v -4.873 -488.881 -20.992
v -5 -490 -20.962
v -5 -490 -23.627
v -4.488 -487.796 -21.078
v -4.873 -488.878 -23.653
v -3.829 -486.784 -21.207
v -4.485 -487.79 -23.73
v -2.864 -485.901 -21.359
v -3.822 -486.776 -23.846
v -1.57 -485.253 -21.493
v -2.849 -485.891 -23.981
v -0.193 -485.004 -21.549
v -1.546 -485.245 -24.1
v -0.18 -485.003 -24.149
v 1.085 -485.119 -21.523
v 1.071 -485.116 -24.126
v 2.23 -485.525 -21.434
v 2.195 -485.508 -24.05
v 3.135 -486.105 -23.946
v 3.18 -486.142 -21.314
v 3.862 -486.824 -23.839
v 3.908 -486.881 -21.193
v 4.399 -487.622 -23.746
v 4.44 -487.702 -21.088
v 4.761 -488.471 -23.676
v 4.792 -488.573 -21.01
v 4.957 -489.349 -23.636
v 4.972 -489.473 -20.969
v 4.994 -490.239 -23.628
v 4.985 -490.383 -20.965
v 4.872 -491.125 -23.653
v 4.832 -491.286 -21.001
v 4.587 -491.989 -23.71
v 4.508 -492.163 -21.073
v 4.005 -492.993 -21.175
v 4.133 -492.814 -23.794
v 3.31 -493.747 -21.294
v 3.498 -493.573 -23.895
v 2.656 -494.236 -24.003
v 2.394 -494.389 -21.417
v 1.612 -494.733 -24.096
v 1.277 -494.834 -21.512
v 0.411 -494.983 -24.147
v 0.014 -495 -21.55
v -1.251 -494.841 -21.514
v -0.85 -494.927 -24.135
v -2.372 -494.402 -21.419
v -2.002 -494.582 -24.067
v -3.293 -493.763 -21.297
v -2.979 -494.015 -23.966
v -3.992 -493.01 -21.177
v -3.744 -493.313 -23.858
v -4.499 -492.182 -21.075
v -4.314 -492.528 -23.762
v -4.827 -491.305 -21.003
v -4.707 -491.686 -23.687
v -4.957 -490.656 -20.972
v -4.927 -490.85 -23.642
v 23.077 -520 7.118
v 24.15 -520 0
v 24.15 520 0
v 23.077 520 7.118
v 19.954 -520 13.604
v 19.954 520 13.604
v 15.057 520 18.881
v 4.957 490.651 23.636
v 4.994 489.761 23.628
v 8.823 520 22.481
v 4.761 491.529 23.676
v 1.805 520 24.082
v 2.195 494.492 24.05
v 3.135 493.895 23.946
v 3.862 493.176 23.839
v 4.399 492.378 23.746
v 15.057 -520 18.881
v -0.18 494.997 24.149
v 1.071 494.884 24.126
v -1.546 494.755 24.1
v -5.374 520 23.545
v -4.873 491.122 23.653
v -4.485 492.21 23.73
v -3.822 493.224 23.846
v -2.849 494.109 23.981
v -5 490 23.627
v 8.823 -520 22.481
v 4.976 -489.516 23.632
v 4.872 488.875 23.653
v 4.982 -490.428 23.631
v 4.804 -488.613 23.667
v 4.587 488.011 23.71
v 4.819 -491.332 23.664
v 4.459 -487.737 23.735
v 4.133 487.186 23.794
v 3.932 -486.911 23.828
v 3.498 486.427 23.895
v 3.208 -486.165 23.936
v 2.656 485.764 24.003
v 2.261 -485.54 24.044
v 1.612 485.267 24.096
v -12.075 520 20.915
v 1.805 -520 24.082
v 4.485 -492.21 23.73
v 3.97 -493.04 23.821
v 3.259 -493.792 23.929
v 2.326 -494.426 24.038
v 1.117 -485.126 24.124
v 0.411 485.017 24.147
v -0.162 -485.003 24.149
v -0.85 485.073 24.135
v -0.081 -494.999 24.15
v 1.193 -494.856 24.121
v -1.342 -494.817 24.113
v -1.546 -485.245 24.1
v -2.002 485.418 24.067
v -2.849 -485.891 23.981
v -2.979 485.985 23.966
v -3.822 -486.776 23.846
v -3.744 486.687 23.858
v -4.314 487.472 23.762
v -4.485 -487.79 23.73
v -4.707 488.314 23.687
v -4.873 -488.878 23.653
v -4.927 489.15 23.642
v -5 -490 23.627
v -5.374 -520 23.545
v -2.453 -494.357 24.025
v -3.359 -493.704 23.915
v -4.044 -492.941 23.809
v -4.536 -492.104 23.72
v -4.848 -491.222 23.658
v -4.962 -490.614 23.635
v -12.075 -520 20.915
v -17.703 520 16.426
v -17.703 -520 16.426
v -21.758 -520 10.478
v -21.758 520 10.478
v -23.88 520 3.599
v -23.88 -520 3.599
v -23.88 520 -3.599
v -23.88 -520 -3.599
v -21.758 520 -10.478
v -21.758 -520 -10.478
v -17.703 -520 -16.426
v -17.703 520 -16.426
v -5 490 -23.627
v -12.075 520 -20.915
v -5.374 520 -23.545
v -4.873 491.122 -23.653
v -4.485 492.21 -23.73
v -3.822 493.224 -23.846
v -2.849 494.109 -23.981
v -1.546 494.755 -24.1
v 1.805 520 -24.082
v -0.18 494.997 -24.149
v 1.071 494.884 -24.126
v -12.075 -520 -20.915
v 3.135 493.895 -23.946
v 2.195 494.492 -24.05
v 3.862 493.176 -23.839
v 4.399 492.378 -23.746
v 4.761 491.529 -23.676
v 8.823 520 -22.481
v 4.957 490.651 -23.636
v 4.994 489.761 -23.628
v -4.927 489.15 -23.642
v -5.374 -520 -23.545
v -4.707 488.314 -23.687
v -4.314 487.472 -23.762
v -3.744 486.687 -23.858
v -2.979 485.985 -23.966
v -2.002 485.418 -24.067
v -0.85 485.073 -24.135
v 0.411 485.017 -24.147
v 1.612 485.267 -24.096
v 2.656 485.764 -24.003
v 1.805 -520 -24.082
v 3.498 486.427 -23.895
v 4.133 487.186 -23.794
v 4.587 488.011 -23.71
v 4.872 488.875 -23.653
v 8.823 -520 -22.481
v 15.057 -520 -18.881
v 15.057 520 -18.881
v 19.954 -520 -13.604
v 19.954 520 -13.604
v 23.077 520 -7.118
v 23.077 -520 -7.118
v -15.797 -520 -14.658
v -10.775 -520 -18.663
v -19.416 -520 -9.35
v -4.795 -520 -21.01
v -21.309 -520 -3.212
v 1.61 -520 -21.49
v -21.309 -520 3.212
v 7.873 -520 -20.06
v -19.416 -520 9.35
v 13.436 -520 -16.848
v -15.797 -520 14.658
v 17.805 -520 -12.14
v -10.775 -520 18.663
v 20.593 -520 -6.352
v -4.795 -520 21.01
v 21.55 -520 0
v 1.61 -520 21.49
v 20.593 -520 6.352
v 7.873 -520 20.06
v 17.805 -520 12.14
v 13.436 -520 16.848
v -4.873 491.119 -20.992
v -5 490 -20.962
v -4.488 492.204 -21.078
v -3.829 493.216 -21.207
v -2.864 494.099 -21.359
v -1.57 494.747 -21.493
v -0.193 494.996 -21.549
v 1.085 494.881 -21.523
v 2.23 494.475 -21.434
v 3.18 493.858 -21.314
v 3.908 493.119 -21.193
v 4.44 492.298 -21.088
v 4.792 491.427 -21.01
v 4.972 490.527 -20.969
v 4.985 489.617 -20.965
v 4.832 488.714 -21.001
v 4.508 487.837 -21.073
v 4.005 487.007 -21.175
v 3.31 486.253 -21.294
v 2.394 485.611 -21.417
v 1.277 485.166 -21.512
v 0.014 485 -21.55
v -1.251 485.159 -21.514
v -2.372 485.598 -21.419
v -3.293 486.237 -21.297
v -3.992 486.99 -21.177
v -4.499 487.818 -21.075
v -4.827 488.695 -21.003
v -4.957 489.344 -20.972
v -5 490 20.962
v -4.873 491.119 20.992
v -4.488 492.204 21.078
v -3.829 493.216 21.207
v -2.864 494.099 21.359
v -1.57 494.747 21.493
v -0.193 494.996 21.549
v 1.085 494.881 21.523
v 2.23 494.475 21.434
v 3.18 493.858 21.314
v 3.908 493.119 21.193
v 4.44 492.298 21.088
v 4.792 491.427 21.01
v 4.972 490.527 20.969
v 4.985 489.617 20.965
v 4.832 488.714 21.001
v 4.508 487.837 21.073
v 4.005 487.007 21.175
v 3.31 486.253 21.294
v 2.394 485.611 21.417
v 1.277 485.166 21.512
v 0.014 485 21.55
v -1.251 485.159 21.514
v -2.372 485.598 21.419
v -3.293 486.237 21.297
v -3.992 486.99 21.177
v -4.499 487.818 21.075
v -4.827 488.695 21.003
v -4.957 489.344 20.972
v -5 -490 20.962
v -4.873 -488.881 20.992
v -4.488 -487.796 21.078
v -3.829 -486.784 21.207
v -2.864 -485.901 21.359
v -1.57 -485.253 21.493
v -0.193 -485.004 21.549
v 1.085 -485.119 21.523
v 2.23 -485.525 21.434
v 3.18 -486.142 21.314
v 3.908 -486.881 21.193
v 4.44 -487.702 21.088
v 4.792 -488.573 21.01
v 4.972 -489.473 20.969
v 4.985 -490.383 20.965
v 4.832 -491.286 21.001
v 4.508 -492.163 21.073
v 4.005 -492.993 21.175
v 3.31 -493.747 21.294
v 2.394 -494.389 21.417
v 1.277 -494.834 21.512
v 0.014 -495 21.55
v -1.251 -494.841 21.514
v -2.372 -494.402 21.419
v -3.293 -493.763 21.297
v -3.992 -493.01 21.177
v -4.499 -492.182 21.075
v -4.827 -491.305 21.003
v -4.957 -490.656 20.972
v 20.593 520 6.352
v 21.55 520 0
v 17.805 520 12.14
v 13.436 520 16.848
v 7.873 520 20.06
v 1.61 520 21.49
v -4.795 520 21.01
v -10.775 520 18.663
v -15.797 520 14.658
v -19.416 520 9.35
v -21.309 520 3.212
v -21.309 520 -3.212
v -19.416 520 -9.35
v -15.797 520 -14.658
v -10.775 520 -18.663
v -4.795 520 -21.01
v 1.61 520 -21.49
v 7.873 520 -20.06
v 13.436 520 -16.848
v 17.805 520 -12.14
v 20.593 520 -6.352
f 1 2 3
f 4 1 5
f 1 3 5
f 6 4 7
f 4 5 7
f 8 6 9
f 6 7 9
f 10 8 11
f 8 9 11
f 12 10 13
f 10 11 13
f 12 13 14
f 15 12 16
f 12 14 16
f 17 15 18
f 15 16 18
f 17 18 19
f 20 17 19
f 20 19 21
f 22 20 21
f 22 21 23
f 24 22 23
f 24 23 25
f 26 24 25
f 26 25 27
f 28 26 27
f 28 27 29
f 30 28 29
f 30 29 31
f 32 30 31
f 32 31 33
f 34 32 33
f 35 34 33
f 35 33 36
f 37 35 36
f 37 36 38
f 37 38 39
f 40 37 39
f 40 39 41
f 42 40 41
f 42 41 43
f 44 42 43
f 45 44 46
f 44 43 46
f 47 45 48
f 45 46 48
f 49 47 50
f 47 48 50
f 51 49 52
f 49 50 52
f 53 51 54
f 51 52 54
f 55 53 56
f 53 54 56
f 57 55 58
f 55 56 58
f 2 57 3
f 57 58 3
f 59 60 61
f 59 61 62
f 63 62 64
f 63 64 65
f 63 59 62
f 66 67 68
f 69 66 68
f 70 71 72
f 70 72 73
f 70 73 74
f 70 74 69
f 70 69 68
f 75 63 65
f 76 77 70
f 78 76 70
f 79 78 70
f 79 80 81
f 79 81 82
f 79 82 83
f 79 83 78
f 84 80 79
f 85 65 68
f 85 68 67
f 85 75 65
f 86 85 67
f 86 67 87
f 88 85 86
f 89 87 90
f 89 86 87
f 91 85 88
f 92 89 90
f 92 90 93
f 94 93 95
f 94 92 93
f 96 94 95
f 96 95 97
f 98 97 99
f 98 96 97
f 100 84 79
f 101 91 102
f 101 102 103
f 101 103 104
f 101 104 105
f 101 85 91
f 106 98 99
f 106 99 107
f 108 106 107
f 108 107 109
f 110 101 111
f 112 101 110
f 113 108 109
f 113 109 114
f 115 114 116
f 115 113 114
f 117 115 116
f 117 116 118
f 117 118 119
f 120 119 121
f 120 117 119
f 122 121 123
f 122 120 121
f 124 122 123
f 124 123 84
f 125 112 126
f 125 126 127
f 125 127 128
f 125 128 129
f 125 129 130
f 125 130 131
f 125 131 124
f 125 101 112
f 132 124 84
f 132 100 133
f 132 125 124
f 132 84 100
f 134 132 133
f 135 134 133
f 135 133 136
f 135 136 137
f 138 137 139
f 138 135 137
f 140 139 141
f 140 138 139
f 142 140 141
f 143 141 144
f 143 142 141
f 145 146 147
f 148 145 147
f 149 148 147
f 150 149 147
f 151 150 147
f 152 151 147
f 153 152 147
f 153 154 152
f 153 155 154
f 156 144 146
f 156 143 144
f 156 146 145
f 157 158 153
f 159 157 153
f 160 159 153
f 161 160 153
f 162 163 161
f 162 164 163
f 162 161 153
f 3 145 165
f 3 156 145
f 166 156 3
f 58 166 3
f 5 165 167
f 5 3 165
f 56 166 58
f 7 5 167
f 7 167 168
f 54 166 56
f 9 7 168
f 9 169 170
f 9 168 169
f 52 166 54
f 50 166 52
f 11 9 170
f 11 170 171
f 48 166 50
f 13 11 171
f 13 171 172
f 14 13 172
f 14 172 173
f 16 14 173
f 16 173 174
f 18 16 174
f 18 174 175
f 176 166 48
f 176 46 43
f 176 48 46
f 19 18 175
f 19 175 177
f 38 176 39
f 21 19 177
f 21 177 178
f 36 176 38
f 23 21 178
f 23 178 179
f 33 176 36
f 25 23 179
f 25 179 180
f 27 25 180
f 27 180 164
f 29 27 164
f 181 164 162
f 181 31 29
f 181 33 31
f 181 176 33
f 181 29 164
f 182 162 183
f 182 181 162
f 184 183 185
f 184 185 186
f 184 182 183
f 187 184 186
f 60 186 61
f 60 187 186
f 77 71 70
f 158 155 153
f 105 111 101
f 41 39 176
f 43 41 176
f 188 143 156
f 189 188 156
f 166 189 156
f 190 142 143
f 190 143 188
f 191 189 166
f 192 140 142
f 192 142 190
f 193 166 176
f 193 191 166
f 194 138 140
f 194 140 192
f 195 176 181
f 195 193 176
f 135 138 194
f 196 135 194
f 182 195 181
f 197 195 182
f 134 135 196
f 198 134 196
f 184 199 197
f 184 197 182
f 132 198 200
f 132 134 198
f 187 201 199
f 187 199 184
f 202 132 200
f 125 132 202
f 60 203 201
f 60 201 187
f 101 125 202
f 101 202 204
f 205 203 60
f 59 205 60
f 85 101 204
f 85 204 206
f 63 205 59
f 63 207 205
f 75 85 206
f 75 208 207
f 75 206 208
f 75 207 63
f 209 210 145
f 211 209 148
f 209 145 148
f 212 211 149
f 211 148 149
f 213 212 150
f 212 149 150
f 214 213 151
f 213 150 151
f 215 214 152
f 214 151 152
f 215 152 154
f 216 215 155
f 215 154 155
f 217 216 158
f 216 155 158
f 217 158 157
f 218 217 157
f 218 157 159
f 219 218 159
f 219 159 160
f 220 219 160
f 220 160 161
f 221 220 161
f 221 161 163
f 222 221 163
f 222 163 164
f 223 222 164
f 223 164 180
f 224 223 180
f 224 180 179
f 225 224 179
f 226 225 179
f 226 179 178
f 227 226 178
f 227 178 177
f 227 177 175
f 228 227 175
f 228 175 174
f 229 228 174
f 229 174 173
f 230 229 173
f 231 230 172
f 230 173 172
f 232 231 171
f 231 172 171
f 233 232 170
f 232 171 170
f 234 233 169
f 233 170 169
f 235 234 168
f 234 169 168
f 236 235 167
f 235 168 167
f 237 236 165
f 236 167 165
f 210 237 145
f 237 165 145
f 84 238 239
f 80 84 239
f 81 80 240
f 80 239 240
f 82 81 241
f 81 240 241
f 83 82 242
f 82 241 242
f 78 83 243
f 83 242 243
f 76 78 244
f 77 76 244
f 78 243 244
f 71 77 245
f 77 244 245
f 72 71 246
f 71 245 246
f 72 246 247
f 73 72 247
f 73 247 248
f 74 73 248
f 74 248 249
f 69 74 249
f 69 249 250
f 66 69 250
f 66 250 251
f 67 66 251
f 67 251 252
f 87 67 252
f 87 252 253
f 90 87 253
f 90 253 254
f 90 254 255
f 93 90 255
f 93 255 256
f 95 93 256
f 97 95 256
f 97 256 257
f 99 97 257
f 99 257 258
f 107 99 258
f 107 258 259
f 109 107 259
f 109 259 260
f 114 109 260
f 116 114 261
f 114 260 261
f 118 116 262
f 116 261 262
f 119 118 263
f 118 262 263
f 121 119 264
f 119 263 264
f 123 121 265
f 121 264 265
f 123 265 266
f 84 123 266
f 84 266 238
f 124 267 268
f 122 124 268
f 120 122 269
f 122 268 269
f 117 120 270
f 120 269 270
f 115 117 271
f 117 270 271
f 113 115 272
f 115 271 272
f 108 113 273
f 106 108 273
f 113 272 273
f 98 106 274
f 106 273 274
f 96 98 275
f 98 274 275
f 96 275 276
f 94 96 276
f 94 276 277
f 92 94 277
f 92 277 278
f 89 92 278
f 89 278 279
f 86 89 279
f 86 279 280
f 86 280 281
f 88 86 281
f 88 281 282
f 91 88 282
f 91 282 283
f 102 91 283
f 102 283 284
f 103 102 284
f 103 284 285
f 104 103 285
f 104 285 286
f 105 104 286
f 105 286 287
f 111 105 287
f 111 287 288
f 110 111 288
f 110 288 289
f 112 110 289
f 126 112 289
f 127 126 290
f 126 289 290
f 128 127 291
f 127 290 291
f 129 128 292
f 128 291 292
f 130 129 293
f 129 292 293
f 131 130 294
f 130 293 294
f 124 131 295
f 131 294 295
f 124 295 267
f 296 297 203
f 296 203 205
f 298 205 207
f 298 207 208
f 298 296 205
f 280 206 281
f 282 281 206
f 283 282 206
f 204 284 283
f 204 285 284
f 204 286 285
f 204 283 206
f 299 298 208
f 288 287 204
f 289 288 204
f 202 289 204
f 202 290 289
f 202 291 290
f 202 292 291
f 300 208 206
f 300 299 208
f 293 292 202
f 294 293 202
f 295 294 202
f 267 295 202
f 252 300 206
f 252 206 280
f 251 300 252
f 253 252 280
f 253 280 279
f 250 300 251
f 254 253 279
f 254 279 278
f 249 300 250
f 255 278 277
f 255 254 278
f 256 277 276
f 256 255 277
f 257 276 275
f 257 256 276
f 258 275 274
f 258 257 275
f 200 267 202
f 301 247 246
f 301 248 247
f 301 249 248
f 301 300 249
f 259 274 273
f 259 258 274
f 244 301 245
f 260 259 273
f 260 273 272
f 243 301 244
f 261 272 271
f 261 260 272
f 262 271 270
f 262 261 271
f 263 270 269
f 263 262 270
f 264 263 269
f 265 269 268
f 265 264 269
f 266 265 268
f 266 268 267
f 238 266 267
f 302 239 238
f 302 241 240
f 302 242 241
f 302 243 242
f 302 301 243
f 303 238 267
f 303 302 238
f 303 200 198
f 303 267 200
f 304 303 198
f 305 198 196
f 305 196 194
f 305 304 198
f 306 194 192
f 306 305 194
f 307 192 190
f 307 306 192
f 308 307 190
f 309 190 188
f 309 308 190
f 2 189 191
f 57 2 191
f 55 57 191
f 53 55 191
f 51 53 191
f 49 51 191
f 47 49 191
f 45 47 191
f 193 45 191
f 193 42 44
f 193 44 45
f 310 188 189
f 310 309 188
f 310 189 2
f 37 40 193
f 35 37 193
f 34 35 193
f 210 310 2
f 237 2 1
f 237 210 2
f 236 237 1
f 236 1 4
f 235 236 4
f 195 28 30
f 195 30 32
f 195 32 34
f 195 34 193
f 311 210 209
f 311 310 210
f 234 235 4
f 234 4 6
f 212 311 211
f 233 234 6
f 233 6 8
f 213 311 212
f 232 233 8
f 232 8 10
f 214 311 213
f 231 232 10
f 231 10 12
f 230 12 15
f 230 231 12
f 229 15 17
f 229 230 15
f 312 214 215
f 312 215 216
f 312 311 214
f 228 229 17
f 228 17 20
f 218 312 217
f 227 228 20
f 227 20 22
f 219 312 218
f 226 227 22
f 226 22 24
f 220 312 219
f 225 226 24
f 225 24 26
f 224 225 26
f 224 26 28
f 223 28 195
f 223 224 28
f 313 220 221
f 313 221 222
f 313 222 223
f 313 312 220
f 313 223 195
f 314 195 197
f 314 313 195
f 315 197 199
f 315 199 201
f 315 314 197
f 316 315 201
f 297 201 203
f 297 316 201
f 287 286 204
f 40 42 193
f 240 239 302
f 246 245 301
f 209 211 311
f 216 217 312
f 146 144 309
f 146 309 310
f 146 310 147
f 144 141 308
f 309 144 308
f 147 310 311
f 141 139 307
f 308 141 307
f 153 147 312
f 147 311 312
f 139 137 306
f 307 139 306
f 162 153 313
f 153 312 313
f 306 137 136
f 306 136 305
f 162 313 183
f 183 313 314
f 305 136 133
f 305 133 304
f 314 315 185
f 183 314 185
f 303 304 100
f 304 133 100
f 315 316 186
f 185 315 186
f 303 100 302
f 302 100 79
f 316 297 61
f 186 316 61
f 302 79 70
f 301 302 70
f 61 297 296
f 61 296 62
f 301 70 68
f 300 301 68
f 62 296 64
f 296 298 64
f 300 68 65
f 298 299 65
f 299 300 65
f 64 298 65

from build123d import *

# Parameters (mm, degrees)
F0_R     = 24.15
F0_R_2   = 21.55
F1_DEPTH = 520
F4_D     = 10


with BuildPart() as f1:
    # F0 (on Front) → F1 (new body, symmetric)
    with BuildSketch(Plane.XZ):
        Circle(F0_R)
        Circle(F0_R_2, mode=Mode.SUBTRACT)
    extrude(amount=F1_DEPTH, both=True)

    # F4 (through all)
    with Locations(Plane.XY.offset(24.15)):
        with Locations((0, -490), (0, 490)):
            Hole(F4_D / 2)


solid = f1.part
